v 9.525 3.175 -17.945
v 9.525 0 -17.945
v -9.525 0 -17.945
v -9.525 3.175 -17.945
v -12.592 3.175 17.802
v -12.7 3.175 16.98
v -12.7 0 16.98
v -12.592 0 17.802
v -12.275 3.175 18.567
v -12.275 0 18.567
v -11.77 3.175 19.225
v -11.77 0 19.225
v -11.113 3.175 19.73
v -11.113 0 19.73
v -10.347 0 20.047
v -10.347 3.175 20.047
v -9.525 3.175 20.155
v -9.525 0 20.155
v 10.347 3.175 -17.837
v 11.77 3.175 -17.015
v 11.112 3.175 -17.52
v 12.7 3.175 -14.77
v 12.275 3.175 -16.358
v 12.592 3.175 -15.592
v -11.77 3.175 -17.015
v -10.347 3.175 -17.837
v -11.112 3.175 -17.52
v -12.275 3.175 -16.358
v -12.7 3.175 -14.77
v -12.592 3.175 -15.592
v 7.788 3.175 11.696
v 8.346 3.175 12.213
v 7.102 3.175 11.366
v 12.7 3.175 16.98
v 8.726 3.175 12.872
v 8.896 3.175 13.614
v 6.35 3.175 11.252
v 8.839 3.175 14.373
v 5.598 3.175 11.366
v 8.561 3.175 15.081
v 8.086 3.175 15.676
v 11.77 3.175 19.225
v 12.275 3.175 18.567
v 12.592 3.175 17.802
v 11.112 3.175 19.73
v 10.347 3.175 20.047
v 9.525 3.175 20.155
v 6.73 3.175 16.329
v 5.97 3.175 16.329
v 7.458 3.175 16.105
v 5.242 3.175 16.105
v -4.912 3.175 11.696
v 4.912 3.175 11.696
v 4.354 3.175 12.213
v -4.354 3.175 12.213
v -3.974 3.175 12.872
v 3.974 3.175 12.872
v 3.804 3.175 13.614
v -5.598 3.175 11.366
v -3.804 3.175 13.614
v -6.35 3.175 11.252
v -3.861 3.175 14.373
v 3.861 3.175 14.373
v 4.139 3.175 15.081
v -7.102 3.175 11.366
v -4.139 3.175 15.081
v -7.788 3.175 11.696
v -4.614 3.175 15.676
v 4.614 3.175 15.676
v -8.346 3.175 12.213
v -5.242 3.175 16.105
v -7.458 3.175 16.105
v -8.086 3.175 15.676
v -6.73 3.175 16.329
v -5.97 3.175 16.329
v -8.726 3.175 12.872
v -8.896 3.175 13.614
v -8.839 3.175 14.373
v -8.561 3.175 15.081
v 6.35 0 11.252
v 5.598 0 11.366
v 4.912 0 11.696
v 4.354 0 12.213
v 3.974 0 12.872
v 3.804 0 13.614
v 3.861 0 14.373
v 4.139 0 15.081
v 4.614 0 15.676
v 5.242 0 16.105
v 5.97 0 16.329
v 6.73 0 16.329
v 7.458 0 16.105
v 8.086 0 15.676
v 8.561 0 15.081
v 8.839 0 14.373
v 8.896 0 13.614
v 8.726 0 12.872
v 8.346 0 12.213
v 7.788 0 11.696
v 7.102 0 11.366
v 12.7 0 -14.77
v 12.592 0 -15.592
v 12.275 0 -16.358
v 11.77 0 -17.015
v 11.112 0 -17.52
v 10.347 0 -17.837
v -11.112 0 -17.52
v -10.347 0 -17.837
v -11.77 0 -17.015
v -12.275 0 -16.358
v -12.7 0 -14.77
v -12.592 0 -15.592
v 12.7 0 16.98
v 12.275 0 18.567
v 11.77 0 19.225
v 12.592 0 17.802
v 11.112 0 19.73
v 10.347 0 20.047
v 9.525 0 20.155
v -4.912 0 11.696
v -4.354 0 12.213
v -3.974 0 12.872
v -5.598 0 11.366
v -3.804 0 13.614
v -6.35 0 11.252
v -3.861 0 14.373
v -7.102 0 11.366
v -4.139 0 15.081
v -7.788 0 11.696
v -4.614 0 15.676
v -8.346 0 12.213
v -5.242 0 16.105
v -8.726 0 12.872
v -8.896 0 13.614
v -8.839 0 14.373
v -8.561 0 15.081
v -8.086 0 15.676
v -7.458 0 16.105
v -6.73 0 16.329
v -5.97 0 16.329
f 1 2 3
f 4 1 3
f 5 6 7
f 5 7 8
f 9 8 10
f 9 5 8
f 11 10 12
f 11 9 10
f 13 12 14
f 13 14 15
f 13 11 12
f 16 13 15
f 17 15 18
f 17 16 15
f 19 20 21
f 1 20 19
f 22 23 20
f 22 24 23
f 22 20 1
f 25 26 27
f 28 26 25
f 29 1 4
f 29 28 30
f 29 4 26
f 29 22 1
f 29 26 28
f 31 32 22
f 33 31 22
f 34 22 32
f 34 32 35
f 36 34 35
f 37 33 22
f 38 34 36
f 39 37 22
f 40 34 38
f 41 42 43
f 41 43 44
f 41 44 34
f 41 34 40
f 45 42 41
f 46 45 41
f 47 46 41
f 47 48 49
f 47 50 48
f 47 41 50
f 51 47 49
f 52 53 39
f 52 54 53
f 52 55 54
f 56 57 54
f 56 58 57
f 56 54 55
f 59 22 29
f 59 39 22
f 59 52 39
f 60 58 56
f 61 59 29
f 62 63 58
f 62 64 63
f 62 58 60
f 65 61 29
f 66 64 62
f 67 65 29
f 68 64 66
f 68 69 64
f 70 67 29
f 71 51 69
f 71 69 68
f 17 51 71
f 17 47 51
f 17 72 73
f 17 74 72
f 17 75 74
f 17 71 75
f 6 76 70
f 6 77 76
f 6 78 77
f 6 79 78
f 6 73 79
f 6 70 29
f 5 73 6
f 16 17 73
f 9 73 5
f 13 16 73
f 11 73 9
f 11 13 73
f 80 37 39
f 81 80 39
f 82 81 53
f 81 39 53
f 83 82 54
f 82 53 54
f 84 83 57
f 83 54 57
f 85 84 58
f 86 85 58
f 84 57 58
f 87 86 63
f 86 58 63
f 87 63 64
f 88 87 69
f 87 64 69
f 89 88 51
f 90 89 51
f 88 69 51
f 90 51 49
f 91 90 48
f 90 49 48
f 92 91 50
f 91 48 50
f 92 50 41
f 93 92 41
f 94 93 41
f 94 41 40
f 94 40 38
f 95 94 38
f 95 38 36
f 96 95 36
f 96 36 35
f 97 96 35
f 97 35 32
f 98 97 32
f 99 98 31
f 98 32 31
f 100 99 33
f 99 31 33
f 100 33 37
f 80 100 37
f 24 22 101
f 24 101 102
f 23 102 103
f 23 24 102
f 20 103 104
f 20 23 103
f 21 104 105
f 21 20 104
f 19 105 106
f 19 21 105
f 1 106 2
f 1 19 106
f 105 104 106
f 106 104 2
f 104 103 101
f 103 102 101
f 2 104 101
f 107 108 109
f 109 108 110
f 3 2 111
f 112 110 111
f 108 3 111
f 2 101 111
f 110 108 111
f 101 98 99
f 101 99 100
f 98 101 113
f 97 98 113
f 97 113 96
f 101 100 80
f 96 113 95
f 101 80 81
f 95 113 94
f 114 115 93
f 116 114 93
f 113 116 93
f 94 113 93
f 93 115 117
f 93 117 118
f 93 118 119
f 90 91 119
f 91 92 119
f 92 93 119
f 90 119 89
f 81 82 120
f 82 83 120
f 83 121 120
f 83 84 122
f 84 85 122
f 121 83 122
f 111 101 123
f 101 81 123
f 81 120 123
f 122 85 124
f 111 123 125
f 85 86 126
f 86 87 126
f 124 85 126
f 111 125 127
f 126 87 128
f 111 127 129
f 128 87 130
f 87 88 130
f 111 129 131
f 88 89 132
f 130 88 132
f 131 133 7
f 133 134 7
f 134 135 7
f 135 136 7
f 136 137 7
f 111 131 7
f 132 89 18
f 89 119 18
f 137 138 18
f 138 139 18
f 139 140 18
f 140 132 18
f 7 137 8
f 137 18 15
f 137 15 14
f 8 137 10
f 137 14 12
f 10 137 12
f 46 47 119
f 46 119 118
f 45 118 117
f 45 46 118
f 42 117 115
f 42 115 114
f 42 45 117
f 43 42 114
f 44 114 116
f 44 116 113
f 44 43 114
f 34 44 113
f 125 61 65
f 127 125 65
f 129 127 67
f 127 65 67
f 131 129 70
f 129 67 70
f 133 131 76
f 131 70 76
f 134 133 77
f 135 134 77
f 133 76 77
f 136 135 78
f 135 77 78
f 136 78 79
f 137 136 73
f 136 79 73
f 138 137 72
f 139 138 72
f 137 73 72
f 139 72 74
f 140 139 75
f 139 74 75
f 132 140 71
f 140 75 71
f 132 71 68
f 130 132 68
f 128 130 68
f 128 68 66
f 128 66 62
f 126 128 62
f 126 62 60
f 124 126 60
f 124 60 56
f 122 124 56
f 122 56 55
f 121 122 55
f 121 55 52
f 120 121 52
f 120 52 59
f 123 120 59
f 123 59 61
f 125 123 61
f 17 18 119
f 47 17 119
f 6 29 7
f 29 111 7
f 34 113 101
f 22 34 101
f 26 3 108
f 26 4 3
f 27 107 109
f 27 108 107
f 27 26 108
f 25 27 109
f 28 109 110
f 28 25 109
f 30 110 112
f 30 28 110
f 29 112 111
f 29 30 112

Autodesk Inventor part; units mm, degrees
ref_plane "YZ Plane" through (0, 0, 0) normal (1, 0, 0) x (0, 1, 0)
ref_plane "XZ Plane" through (0, 0, 0) normal (0, 1, 0) x (-1, 0, 0)
ref_plane "XY Plane" through (0, 0, 0) normal (0, 0, 1) x (1, 0, 0)
sketch "Sketch1" plane through (0, 0, 0) normal (0, 1, 0) x (-1, 0, 0)
  line L0 (8.89, 0) -> (-8.89, 0) construction
  line L1 (8.89, 1.5875) -> (-8.89, 1.5875)
  line L2 (-8.89, -1.5875) -> (8.89, -1.5875)
  arc A0 (8.89, -1.5875) -> (8.89, 1.5875) centre (8.89, 0) ccw
  arc A1 (-8.89, 1.5875) -> (-8.89, -1.5875) centre (-8.89, 0) ccw
  line L3 (8.89, -5.0038) -> (-8.89, -5.0038) construction
  line L4 (8.89, -3.4163) -> (-8.89, -3.4163)
  line L5 (-8.89, -6.5913) -> (8.89, -6.5913)
  arc A2 (8.89, -6.5913) -> (8.89, -3.4163) centre (8.89, -5.0038) ccw
  arc A3 (-8.89, -3.4163) -> (-8.89, -6.5913) centre (-8.89, -5.0038) ccw
  line L6 (8.89, -10.0076) -> (-8.89, -10.0076) construction
  line L7 (8.89, -8.4201) -> (-8.89, -8.4201)
  line L8 (-8.89, -11.5951) -> (8.89, -11.5951)
  arc A4 (8.89, -11.5951) -> (8.89, -8.4201) centre (8.89, -10.0076) ccw
  arc A5 (-8.89, -8.4201) -> (-8.89, -11.5951) centre (-8.89, -10.0076) ccw
  line L9 (12.7, 20.1549) -> (-12.7, 20.1549)
  line L10 (-12.7, 20.1549) -> (-12.7, -17.9451)
  line L11 (-12.7, -17.9451) -> (12.7, -17.9451)
  line L12 (12.7, -17.9451) -> (12.7, 20.1549)
  line L13 (6.35, 13.8049) -> (-6.35, 13.8049) construction
  line L14 (-8.89, -16.5989) -> (8.89, -16.5989)
  arc A6 (8.89, -16.5989) -> (8.89, -13.4239) centre (8.89, -15.0114) ccw
  line L15 (8.89, -13.4239) -> (-8.89, -13.4239)
  line L16 (8.89, -15.0114) -> (-8.89, -15.0114) construction
  arc A7 (-8.89, -13.4239) -> (-8.89, -16.5989) centre (-8.89, -15.0114) ccw
  point P0 (0, 0)
  point P1 (0, -5.0038)
  point P2 (0, -10.0076)
  point P3 (10.4775, -5.0038)
  point P4 (10.4775, 0)
  point P5 (10.4775, -10.0076)
  point P6 (0, -17.9451)
  point P7 (0, -11.5951)
  point P8 (0, 13.8049)
  point P9 (0, 20.1549)
  point P10 (0, -16.5989)
  point P11 (10.4775, -15.0114)
  dimension "d1" = 17.78
  dimension "d3" = 3.175
  dimension "d4" = 5.0038
  dimension "d5" = 5.0038
  dimension "d8" = 25.4
  dimension "d9" = 38.1
  dimension "d10" = 6.35
  dimension "d11" = 12.7
  dimension "d12" = 6.35
  dimension "d25" = 5.0038
extrude "Extrusion1" add sketch "Sketch1" along normal blind 3.175 contours A0 L2 A1 L1 | A2 L5 A3 L4 | A4 L8 A5 L7 | L12 L11 L10 L9 | A7 L15 A6 L14
hole "Hole1" at (-6.35, 0, 13.8049) at (6.35, 0, 13.8049) direction (0, 1, 0) diameter 5.1054 end through all clearance for "Flat Head Machine Screw (82)" size "#10" standard "Ansi Unified Screw Threads"
fillet "Fillet1" radius 3.175 4 edges at (-12.7, 1.5875, -17.9451) (12.7, 1.5875, -17.9451) (12.7, 1.5875, 20.1549) (-12.7, 1.5875, 20.1549)
equation "\"d5\" = d4"
properties part number "EL2-035" material "Aluminum 6061"
